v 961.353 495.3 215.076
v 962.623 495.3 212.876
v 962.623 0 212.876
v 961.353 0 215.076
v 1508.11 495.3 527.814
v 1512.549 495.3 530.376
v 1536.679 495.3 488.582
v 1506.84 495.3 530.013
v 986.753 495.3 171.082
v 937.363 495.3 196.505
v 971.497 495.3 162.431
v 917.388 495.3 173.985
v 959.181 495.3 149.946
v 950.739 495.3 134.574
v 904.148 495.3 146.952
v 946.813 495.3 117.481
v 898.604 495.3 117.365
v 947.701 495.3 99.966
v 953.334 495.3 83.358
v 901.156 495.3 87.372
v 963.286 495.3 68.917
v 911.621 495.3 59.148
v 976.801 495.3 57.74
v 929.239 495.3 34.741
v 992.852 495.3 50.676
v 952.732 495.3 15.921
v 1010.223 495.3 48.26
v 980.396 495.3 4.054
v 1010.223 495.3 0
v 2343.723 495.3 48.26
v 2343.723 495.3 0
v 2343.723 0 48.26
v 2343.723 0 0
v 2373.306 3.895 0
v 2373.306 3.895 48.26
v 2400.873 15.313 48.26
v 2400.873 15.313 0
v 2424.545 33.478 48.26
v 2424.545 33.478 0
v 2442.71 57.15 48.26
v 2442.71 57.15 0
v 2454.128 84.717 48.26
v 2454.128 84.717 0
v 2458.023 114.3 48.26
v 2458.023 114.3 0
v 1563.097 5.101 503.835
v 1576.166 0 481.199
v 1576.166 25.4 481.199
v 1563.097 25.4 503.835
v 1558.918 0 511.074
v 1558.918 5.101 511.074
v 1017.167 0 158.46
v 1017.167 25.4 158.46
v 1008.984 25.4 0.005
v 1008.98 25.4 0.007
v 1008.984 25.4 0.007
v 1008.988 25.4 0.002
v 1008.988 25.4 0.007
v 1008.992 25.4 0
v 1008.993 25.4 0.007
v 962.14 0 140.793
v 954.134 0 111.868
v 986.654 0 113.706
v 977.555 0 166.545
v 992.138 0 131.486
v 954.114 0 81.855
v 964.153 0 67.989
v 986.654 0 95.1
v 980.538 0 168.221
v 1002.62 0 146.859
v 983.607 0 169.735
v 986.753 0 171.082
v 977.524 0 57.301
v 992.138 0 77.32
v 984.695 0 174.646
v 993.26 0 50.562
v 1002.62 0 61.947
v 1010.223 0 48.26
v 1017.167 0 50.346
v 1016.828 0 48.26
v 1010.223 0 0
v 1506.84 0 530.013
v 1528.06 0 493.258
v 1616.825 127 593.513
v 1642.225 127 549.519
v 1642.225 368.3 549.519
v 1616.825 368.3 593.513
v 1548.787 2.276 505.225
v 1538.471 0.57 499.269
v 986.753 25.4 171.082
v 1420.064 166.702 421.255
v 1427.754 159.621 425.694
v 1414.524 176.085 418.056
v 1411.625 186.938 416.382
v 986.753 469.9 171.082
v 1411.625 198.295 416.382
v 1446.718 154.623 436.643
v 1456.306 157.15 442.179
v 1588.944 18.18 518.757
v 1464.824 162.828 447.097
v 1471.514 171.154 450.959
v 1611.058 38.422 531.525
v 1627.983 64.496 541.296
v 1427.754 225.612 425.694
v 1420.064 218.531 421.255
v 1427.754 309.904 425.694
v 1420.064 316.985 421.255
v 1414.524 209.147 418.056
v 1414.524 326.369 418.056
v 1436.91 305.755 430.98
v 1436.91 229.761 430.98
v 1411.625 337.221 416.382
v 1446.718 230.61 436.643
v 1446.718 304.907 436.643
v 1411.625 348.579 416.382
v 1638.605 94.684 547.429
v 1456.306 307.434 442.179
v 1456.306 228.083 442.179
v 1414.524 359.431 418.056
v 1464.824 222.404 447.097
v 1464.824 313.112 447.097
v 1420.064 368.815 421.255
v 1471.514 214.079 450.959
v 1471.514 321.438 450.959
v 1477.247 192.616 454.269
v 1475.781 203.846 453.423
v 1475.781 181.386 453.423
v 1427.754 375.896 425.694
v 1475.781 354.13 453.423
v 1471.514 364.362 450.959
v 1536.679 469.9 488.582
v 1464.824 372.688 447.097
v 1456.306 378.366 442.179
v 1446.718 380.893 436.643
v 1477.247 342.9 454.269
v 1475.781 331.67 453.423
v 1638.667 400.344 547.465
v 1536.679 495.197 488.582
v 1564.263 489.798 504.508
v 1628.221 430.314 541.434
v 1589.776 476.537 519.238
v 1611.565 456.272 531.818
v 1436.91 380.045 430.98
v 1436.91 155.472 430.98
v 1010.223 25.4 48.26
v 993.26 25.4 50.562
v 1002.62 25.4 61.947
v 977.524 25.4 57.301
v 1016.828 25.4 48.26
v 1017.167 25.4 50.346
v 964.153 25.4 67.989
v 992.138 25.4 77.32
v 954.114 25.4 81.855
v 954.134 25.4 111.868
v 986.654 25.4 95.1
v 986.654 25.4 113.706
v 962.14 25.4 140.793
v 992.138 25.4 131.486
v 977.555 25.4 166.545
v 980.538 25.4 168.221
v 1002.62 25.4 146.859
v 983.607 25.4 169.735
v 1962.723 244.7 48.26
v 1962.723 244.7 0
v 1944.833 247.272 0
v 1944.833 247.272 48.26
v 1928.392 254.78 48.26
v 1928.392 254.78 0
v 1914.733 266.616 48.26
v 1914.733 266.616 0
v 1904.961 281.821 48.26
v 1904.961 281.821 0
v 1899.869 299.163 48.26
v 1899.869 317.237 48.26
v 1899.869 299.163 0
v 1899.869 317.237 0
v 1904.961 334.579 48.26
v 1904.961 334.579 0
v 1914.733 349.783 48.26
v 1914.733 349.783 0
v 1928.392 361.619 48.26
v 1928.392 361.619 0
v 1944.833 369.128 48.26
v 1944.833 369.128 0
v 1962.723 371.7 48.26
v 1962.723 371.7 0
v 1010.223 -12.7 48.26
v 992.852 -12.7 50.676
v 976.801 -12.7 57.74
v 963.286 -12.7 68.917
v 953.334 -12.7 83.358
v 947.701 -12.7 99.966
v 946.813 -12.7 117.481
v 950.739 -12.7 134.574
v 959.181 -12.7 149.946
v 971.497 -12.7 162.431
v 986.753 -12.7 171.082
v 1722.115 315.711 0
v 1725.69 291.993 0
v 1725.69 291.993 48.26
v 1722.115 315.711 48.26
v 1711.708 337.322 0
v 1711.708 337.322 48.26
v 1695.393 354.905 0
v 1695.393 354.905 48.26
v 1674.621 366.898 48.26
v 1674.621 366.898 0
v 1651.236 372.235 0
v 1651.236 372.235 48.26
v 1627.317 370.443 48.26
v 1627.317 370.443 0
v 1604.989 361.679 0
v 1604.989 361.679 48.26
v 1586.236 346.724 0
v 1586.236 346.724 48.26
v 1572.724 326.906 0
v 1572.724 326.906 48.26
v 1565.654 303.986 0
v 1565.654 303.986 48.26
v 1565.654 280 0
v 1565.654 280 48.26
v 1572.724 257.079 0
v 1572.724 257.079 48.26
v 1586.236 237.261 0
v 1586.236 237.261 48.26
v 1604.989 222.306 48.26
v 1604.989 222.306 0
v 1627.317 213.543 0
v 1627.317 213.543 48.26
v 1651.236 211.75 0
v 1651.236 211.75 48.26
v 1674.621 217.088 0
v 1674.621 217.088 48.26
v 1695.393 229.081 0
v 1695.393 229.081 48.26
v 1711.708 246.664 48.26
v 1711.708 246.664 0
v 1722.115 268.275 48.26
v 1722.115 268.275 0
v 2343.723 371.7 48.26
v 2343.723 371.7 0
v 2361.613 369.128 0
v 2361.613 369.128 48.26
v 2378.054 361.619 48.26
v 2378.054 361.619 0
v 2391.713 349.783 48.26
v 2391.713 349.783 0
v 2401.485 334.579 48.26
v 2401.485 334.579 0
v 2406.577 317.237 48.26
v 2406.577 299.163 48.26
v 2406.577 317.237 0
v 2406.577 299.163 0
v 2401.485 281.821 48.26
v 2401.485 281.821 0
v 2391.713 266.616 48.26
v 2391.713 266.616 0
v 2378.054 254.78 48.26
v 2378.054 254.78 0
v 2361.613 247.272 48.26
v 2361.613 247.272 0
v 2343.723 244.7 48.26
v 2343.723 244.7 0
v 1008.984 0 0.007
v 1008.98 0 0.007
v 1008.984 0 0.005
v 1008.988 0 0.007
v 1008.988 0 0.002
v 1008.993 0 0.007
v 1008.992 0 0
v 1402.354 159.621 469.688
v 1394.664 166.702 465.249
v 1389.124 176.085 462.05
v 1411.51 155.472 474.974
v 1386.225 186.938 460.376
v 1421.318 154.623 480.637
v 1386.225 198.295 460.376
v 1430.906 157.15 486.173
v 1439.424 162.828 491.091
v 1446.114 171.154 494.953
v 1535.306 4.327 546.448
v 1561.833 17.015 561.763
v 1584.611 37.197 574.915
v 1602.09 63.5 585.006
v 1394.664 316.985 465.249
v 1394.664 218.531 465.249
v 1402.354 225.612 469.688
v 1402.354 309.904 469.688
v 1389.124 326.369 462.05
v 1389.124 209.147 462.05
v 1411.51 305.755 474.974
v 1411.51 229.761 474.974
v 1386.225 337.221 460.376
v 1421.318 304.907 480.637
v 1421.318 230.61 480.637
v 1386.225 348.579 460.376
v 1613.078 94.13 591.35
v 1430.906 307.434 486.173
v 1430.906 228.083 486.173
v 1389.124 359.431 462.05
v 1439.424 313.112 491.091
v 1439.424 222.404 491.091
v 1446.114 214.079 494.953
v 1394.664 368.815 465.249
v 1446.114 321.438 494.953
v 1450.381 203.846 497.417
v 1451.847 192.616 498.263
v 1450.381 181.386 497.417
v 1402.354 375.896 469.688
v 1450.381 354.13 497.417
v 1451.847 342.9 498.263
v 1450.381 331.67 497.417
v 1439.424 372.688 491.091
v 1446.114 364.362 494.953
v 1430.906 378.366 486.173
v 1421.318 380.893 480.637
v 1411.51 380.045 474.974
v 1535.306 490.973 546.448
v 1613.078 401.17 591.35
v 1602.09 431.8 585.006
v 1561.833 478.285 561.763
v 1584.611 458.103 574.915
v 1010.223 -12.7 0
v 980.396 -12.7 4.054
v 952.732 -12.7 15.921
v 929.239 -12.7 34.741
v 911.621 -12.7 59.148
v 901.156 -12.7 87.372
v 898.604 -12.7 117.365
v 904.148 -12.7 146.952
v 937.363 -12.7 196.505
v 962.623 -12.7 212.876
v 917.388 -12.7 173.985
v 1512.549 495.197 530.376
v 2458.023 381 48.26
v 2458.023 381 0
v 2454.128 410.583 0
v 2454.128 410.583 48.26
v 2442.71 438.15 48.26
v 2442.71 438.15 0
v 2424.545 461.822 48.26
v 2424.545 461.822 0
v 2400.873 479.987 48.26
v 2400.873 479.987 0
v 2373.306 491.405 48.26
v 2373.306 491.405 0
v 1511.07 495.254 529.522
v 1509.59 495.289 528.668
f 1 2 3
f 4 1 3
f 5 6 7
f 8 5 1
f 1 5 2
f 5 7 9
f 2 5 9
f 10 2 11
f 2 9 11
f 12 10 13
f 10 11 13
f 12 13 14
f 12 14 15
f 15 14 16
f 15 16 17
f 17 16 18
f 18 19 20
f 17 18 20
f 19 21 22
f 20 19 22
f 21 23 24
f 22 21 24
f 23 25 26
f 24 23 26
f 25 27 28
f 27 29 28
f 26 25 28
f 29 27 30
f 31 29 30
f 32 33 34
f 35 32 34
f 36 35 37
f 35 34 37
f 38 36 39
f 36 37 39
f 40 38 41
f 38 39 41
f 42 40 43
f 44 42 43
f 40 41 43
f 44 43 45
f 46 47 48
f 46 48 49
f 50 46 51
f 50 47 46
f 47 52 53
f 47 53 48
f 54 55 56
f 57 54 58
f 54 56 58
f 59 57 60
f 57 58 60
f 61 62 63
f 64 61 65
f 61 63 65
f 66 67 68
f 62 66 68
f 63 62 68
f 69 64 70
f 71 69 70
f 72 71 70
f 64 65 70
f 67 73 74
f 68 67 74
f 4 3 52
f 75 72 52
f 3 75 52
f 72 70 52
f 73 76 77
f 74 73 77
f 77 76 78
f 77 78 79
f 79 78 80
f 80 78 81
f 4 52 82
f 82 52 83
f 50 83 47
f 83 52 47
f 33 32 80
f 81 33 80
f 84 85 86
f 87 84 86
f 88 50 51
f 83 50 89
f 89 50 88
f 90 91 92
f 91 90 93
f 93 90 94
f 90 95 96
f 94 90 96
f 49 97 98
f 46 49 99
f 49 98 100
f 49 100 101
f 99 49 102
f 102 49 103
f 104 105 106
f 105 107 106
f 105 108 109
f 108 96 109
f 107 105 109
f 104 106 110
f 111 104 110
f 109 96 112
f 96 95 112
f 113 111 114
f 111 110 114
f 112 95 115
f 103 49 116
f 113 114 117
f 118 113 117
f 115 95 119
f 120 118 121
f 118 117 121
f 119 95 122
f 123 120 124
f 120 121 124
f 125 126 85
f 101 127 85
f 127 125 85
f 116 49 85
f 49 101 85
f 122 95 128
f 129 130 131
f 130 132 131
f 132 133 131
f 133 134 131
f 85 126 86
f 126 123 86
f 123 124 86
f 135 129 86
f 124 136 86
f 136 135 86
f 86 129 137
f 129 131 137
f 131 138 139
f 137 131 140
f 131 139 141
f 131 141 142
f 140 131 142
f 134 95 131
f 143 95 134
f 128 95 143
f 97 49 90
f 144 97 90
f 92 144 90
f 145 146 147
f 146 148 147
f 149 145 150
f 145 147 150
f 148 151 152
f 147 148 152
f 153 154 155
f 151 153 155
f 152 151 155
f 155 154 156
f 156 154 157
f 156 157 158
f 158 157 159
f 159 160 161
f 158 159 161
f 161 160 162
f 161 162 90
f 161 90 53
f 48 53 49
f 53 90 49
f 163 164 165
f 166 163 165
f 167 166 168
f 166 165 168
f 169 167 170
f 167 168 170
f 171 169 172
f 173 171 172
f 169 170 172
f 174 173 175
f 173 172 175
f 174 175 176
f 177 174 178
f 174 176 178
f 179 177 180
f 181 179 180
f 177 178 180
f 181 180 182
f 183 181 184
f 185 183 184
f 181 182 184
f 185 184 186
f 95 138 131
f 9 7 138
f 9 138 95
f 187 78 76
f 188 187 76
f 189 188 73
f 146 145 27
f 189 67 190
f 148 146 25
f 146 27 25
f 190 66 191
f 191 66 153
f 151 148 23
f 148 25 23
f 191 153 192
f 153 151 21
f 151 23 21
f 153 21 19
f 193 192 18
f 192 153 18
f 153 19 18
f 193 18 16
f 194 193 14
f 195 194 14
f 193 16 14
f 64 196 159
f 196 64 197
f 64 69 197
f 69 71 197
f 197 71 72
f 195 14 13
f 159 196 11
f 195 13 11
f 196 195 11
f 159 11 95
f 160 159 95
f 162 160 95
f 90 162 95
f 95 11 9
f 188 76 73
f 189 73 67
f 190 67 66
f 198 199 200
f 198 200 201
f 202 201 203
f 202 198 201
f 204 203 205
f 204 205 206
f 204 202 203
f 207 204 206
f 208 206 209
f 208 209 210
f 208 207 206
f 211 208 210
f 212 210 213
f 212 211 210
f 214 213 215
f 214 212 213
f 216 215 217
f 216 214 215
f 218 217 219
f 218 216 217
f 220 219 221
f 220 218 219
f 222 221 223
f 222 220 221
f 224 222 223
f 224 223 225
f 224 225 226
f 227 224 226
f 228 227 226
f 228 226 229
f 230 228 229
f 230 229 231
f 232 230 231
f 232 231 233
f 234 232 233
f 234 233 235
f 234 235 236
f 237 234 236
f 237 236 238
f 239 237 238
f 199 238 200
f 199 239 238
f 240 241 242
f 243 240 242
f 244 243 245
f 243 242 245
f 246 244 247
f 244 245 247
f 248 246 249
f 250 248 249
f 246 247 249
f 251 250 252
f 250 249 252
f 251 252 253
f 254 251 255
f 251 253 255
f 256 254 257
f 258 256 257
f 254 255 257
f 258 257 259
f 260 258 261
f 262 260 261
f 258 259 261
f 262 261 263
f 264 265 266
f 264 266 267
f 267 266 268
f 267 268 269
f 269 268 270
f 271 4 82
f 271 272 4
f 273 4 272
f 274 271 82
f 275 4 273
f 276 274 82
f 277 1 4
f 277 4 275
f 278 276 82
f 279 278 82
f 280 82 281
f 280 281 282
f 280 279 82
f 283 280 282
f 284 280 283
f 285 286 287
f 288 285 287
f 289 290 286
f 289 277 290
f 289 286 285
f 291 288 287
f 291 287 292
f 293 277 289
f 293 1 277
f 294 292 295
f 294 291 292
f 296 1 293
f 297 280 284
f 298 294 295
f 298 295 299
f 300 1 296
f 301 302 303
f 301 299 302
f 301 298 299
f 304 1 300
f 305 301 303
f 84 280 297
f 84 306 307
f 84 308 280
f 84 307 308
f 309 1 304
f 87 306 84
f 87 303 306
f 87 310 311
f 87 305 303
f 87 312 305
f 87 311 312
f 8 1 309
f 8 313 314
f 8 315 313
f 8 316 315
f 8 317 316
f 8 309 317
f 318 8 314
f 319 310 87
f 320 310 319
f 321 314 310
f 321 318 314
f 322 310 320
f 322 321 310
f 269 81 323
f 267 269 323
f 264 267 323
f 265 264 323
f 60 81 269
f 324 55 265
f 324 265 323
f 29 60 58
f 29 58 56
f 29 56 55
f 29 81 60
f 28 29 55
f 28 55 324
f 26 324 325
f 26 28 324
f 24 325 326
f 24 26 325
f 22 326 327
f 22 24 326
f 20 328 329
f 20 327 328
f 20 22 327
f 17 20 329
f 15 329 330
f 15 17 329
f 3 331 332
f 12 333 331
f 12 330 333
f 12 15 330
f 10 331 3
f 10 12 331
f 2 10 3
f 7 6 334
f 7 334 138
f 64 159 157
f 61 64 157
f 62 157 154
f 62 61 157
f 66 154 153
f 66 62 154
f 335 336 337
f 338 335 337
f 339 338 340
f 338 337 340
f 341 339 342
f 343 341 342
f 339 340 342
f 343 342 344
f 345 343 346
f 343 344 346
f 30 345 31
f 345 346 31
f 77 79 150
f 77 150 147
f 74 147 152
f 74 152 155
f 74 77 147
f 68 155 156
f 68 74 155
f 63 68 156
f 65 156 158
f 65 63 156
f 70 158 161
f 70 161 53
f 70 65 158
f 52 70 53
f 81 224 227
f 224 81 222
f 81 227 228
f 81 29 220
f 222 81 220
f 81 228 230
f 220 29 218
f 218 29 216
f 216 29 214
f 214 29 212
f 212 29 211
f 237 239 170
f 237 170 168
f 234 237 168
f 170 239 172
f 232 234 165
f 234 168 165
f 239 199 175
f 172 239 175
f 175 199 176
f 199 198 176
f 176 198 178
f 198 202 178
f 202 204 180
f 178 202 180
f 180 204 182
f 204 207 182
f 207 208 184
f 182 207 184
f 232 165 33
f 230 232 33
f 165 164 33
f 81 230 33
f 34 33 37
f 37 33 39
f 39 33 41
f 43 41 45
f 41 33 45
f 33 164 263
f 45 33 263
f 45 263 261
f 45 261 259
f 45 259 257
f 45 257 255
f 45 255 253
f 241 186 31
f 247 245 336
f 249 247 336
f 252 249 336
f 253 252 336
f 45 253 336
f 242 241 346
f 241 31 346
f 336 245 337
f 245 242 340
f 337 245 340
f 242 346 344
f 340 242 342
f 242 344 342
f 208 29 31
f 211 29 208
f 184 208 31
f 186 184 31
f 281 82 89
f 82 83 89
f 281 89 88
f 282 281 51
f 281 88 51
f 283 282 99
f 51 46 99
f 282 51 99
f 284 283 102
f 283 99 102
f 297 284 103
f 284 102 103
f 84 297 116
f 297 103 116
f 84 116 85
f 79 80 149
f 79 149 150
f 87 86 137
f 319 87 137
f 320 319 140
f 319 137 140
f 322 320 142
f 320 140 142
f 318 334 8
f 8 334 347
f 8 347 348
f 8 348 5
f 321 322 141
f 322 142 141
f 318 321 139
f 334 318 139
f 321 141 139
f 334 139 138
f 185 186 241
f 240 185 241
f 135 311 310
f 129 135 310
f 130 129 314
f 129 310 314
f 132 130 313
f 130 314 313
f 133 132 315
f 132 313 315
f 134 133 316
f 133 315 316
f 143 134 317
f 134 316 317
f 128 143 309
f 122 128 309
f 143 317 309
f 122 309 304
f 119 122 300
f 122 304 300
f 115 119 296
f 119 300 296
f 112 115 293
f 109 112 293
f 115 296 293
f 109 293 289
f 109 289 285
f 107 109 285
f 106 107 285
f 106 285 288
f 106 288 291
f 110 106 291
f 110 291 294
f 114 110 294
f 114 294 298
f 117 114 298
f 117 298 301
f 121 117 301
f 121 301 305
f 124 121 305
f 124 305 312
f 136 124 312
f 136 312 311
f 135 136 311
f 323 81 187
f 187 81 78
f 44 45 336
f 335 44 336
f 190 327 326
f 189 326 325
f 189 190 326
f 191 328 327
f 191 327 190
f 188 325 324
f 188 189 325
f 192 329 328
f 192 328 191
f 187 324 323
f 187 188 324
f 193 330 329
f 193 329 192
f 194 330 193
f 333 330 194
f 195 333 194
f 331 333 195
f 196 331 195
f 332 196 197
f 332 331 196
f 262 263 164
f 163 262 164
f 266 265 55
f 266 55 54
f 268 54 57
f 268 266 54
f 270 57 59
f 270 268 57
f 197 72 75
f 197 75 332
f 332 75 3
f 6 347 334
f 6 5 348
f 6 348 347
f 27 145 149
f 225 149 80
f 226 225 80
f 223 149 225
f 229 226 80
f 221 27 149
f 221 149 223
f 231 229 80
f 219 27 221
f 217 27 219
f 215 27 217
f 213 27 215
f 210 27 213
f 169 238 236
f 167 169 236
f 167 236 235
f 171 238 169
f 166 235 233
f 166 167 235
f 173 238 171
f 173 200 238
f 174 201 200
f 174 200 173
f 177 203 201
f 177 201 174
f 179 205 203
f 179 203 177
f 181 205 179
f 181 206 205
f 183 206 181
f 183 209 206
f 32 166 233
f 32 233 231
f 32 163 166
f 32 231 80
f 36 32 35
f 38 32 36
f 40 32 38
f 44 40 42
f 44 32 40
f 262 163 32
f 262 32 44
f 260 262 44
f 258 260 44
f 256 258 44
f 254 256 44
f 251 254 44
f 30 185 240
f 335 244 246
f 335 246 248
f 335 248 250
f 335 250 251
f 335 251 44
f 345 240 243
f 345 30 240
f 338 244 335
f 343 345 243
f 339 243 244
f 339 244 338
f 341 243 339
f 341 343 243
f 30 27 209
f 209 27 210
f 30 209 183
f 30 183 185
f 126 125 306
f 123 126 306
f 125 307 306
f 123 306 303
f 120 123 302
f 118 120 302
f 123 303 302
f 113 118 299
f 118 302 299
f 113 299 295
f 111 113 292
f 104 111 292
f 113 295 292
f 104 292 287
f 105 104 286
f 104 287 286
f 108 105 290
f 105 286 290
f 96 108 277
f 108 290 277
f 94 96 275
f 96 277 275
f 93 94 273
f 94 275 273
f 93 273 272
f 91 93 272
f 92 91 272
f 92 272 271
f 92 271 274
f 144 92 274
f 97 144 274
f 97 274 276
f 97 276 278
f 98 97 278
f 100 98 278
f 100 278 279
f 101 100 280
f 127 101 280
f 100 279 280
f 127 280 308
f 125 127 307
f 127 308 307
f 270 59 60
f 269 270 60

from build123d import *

# Parameters (mm, degrees)
F0_R      = 80.4673318477
F1_DEPTH  = 48.26
F4_DEPTH  = 25.4
F6_DEPTH  = 25.4
F8_DEPTH  = 48.26
F9_DEPTH  = 2.54
F11_DEPTH = 482.6
F12_R     = 38.1
F13_DEPTH = 127


with BuildPart() as f1:
    # F0 (on Top) → F1 (new body)
    with BuildSketch(Plane.XY):
        with BuildLine():
            Line((1010.2228706353, 495.3), (1010.2228706353, 0))
            Line((1010.2228706353, 0), (2343.7228706353, 0))
            ThreePointArc((2343.7228706353, 0), (2424.5451757249, 33.4776949104), (2458.0228706353, 114.3))
            Line((2458.0228706353, 114.3), (2458.0228706353, 381))
            ThreePointArc((2458.0228706353, 381), (2424.5451757249, 461.8223050896), (2343.7228706353, 495.3))
            Line((2343.7228706353, 495.3), (1010.2228706353, 495.3))
        make_face()
        with Locations((1645.2228706353, 291.9926941395)):
            Circle(F0_R, mode=Mode.SUBTRACT)
        with BuildLine():
            ThreePointArc((1962.7228706353, 244.6997875276), (1899.2228706353, 308.1997875276), (1962.7228706353, 371.6997875276))
            Line((1962.7228706353, 371.6997875276), (2343.7228706353, 371.6997875276))
            ThreePointArc((2343.7228706353, 371.6997875276), (2407.2228706353, 308.1997875276), (2343.7228706353, 244.6997875276))
            Line((2343.7228706353, 244.6997875276), (1962.7228706353, 244.6997875276))
        make_face(mode=Mode.SUBTRACT)
    extrude(amount=F1_DEPTH)

    # F3 (on face) → F4 (join)
    with BuildSketch(Plane.XZ):
        Polygon((1008.9916278534, 193.5739982539), (1017.166601884, 158.4598601468), (1576.1663705805, 481.1985270807), (1558.9177592565, 511.0739982539), align=None)
        with BuildLine():
            ThreePointArc((1017.166601884, 50.3464564681), (985.9569505255, 104.4031583075), (1017.166601884, 158.4598601468))
            Line((1017.166601884, 158.4598601468), (1008.9916278534, 193.5739982539))
            ThreePointArc((1008.9916278534, 193.5739982539), (953.1116278534, 96.7869991269), (1008.9916278534, 0))
            Line((1008.9916278534, 0), (1017.166601884, 50.3464564681))
        make_face()
    extrude(amount=-F4_DEPTH)



with BuildPart() as f6:
    # F5 (on face) → F6 (new body)
    with BuildSketch(Plane(origin=(0, 495.3, 0), x_dir=(-1, 0, 0), z_dir=(0, 1, 0))):
        with BuildLine():
            Line((-962.622620171, 212.8763377291), (-986.752620171, 171.0819517425))
            ThreePointArc((-986.752620171, 171.0819517425), (-947.7007055922, 99.9659962012), (-1010.2228706353, 48.26))
            Line((-1010.2228706353, 48.26), (-1010.2228706353, 0))
            ThreePointArc((-1010.2228706353, 0), (-901.1562407602, 87.3721372872), (-962.622620171, 212.8763377291))
        make_face()
        Polygon((-1512.5487515741, 530.3763377291), (-1536.6787515741, 488.5819517425), (-986.752620171, 171.0819517425), (-962.622620171, 212.8763377291), align=None)
    extrude(amount=-F6_DEPTH)


with BuildPart() as f1_1:
    add(f1.part)

    add(f6.part)  # F8 merges F6
    # F7 (on face) → F8 (join)
    with BuildSketch(Plane(origin=(148.4774968738, 0, -257.170568366), x_dir=(0.8660254038, 0, 0.5), z_dir=(-0.5, 0, 0.8660254038))):
        with BuildLine():
            Line((1569.96836326, 495.3), (940.0938121902, 495.3))
            Line((940.0938121902, 495.3), (940.0938121902, 0))
            Line((940.0938121902, 0), (1569.96836326, 0))
            ThreePointArc((1569.96836326, 0), (1659.7709244707, 37.1974387893), (1696.96836326, 127))
            Line((1696.96836326, 127), (1696.96836326, 368.3))
            ThreePointArc((1696.96836326, 368.3), (1659.7709244707, 458.1025612107), (1569.96836326, 495.3))
        make_face()
    extrude(amount=-F8_DEPTH)

    # F7 (on face) → F9 (join)
    with BuildSketch(Plane(origin=(148.4774968738, 0, -257.170568366), x_dir=(0.8660254038, 0, 0.5), z_dir=(-0.5, 0, 0.8660254038))):
        with BuildLine():
            Line((1569.96836326, 495.3), (940.0938121902, 495.3))
            Line((940.0938121902, 495.3), (940.0938121902, 0))
            Line((940.0938121902, 0), (1569.96836326, 0))
            ThreePointArc((1569.96836326, 0), (1659.7709244707, 37.1974387893), (1696.96836326, 127))
            Line((1696.96836326, 127), (1696.96836326, 368.3))
            ThreePointArc((1696.96836326, 368.3), (1659.7709244707, 458.1025612107), (1569.96836326, 495.3))
        make_face()
    extrude(amount=F9_DEPTH)

    # F10 (on face) → F11 (join)
    with BuildSketch(Plane.XZ.offset(-469.9)):
        with BuildLine():
            Line((986.752620171, 171.0819517425), (962.622620171, 212.8763377291))
            ThreePointArc((962.622620171, 212.8763377291), (901.1562407602, 87.3721372872), (1010.2228706353, 0))
            Line((1010.2228706353, 0), (1010.2228706353, 48.26))
            ThreePointArc((1010.2228706353, 48.26), (947.7007055922, 99.9659962012), (986.752620171, 171.0819517425))
        make_face()
    extrude(amount=F11_DEPTH)

    # F12 (on face) → F13 (cut, symmetric)
    with BuildSketch(Plane(origin=(147.2074968738, 0, -254.9708638404), x_dir=(0.8660254038, 0, 0.5), z_dir=(-0.5, 0, 0.8660254038))):
        with Locations((1468.36836326, 342.9)):
            Circle(F12_R)
        with Locations((1468.36836326, 192.6162540913)):
            Circle(F12_R)
    extrude(amount=F13_DEPTH, both=True, mode=Mode.SUBTRACT)


solid = f1_1.part
